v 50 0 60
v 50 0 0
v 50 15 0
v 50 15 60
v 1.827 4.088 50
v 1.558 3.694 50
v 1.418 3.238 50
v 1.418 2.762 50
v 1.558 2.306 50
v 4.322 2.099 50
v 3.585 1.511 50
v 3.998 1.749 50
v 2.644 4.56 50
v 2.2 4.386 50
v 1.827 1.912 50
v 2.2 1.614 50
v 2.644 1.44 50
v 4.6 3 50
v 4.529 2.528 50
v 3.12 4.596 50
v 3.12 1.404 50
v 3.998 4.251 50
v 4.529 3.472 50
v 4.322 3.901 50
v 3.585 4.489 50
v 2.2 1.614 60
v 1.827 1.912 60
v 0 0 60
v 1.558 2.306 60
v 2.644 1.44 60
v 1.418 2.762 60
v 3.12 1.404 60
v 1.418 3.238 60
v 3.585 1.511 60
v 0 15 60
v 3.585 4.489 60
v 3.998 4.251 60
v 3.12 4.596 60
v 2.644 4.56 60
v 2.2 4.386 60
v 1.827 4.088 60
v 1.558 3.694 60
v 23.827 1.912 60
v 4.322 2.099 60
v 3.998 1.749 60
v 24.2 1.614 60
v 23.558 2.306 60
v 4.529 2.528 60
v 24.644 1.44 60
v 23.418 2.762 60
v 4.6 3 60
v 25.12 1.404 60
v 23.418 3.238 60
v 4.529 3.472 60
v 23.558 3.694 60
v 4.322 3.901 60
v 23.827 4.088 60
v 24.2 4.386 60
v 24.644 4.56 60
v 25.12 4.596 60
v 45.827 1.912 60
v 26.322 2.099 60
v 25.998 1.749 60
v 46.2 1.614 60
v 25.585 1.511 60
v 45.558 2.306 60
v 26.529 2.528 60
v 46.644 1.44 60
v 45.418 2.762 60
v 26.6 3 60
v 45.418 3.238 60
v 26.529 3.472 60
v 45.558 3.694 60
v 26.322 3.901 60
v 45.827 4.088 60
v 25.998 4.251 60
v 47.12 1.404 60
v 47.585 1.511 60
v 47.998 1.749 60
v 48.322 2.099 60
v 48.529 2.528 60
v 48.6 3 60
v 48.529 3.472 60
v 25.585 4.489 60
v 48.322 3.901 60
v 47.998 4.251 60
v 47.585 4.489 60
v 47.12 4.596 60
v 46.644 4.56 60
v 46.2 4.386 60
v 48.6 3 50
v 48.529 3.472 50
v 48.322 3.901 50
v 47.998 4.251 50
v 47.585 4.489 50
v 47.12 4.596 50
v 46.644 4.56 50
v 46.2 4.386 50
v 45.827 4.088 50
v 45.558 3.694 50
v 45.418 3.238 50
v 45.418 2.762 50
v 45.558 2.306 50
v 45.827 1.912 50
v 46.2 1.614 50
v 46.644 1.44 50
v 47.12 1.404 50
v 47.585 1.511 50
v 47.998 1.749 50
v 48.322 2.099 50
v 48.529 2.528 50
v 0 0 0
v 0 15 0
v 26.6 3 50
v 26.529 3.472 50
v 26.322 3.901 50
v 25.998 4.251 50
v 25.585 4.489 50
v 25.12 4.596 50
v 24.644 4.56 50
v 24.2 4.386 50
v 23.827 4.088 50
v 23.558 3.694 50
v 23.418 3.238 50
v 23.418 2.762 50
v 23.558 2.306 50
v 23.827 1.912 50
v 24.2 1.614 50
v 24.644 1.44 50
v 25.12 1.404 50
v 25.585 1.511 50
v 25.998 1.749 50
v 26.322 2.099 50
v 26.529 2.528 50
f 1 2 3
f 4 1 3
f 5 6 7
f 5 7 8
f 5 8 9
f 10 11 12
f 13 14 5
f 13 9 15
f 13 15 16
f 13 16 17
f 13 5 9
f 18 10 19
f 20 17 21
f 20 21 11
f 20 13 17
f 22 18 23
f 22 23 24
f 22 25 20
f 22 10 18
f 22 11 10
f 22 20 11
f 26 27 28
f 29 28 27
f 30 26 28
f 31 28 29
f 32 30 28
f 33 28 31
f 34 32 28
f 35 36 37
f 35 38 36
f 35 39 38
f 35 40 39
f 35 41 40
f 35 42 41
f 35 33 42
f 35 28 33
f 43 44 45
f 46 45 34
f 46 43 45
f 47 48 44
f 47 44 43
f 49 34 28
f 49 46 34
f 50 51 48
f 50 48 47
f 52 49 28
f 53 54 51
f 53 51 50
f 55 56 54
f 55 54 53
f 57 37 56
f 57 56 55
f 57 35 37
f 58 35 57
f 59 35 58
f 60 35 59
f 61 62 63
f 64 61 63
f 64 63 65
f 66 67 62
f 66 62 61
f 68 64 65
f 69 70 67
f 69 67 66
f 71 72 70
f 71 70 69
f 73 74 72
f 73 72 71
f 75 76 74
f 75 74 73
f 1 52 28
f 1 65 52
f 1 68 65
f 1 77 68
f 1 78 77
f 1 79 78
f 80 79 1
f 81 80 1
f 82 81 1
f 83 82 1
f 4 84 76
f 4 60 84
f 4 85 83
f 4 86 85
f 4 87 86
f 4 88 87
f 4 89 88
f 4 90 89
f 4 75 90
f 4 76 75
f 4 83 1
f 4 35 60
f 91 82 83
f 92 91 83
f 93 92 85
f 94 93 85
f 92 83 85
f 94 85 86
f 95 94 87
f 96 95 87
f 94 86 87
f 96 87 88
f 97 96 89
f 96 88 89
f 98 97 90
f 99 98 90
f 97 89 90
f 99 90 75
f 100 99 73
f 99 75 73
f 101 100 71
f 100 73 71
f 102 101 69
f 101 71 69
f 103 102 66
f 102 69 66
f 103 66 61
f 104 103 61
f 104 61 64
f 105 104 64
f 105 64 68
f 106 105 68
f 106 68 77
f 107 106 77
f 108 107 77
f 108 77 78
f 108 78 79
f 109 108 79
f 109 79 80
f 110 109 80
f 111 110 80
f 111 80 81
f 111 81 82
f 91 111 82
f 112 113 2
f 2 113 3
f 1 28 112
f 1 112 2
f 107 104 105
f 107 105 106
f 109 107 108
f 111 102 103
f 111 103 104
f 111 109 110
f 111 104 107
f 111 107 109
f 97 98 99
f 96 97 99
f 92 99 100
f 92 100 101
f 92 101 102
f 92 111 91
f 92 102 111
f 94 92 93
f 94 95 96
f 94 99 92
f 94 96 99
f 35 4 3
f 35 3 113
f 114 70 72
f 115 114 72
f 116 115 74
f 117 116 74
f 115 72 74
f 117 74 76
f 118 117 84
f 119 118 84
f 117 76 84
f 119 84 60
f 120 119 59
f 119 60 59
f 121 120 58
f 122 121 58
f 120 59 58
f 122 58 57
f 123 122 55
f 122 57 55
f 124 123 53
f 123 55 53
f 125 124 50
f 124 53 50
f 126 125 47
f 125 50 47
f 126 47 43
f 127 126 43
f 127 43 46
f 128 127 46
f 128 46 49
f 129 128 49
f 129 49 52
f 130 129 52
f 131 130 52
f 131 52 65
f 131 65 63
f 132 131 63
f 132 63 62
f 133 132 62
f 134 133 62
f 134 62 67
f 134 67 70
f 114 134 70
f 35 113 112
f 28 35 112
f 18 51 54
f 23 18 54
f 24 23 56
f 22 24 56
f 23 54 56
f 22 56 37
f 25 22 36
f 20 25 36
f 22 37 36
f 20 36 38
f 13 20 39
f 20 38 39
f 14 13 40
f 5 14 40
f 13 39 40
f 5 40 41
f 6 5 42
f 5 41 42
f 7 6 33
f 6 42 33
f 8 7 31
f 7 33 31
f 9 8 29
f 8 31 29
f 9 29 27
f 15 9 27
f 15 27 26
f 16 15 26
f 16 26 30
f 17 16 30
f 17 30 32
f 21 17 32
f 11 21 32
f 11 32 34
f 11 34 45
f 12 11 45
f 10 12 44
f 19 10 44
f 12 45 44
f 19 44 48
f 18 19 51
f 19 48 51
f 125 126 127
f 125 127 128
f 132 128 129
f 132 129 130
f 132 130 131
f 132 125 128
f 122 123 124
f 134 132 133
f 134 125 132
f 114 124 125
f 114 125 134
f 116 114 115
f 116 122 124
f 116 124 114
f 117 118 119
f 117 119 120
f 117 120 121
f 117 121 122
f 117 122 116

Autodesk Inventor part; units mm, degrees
ref_plane "YZ Plane" through (0, 0, 0) normal (1, 0, 0) x (0, 1, 0)
ref_plane "XZ Plane" through (0, 0, 0) normal (0, 1, 0) x (-1, 0, 0)
ref_plane "XY Plane" through (0, 0, 0) normal (0, 0, 1) x (1, 0, 0)
sketch "Sketch1" plane through (0, 0, 0) normal (0, 0, 1) x (1, 0, 0)
  line L0 (0, 0) -> (50, 0)
  line L1 (50, 0) -> (50, 15)
  line L2 (50, 15) -> (0, 15)
  line L3 (0, 15) -> (0, 0)
  dimension "d0" = 50
  dimension "d1" = 15
extrude "Extrusion1" add sketch "Sketch1" along normal blind 60
sketch "Sketch2" plane through (0, 0, 60) normal (0, 0, 1) x (1, 0, 0)
  circle A0 centre (3, 3) radius 1.6
  circle A1 centre (47, 3) radius 1.6
  circle A2 centre (25, 3) radius 1.6
  line L0 (0, 15) -> (0, 0) projected
  line L1 (50, 0) -> (50, 15) projected
  line L2 (0, 0) -> (50, 0) projected
  point P0 (25, 0)
  dimension "d4" = 3.2
  dimension "d5" = 3.2
  dimension "d6" = 3.2
  dimension "d7" = 3
  dimension "d8" = 3
  dimension "d11" = 3
extrude "Extrusion2" cut sketch "Sketch2" against normal blind 10
properties part number "brush rack"
